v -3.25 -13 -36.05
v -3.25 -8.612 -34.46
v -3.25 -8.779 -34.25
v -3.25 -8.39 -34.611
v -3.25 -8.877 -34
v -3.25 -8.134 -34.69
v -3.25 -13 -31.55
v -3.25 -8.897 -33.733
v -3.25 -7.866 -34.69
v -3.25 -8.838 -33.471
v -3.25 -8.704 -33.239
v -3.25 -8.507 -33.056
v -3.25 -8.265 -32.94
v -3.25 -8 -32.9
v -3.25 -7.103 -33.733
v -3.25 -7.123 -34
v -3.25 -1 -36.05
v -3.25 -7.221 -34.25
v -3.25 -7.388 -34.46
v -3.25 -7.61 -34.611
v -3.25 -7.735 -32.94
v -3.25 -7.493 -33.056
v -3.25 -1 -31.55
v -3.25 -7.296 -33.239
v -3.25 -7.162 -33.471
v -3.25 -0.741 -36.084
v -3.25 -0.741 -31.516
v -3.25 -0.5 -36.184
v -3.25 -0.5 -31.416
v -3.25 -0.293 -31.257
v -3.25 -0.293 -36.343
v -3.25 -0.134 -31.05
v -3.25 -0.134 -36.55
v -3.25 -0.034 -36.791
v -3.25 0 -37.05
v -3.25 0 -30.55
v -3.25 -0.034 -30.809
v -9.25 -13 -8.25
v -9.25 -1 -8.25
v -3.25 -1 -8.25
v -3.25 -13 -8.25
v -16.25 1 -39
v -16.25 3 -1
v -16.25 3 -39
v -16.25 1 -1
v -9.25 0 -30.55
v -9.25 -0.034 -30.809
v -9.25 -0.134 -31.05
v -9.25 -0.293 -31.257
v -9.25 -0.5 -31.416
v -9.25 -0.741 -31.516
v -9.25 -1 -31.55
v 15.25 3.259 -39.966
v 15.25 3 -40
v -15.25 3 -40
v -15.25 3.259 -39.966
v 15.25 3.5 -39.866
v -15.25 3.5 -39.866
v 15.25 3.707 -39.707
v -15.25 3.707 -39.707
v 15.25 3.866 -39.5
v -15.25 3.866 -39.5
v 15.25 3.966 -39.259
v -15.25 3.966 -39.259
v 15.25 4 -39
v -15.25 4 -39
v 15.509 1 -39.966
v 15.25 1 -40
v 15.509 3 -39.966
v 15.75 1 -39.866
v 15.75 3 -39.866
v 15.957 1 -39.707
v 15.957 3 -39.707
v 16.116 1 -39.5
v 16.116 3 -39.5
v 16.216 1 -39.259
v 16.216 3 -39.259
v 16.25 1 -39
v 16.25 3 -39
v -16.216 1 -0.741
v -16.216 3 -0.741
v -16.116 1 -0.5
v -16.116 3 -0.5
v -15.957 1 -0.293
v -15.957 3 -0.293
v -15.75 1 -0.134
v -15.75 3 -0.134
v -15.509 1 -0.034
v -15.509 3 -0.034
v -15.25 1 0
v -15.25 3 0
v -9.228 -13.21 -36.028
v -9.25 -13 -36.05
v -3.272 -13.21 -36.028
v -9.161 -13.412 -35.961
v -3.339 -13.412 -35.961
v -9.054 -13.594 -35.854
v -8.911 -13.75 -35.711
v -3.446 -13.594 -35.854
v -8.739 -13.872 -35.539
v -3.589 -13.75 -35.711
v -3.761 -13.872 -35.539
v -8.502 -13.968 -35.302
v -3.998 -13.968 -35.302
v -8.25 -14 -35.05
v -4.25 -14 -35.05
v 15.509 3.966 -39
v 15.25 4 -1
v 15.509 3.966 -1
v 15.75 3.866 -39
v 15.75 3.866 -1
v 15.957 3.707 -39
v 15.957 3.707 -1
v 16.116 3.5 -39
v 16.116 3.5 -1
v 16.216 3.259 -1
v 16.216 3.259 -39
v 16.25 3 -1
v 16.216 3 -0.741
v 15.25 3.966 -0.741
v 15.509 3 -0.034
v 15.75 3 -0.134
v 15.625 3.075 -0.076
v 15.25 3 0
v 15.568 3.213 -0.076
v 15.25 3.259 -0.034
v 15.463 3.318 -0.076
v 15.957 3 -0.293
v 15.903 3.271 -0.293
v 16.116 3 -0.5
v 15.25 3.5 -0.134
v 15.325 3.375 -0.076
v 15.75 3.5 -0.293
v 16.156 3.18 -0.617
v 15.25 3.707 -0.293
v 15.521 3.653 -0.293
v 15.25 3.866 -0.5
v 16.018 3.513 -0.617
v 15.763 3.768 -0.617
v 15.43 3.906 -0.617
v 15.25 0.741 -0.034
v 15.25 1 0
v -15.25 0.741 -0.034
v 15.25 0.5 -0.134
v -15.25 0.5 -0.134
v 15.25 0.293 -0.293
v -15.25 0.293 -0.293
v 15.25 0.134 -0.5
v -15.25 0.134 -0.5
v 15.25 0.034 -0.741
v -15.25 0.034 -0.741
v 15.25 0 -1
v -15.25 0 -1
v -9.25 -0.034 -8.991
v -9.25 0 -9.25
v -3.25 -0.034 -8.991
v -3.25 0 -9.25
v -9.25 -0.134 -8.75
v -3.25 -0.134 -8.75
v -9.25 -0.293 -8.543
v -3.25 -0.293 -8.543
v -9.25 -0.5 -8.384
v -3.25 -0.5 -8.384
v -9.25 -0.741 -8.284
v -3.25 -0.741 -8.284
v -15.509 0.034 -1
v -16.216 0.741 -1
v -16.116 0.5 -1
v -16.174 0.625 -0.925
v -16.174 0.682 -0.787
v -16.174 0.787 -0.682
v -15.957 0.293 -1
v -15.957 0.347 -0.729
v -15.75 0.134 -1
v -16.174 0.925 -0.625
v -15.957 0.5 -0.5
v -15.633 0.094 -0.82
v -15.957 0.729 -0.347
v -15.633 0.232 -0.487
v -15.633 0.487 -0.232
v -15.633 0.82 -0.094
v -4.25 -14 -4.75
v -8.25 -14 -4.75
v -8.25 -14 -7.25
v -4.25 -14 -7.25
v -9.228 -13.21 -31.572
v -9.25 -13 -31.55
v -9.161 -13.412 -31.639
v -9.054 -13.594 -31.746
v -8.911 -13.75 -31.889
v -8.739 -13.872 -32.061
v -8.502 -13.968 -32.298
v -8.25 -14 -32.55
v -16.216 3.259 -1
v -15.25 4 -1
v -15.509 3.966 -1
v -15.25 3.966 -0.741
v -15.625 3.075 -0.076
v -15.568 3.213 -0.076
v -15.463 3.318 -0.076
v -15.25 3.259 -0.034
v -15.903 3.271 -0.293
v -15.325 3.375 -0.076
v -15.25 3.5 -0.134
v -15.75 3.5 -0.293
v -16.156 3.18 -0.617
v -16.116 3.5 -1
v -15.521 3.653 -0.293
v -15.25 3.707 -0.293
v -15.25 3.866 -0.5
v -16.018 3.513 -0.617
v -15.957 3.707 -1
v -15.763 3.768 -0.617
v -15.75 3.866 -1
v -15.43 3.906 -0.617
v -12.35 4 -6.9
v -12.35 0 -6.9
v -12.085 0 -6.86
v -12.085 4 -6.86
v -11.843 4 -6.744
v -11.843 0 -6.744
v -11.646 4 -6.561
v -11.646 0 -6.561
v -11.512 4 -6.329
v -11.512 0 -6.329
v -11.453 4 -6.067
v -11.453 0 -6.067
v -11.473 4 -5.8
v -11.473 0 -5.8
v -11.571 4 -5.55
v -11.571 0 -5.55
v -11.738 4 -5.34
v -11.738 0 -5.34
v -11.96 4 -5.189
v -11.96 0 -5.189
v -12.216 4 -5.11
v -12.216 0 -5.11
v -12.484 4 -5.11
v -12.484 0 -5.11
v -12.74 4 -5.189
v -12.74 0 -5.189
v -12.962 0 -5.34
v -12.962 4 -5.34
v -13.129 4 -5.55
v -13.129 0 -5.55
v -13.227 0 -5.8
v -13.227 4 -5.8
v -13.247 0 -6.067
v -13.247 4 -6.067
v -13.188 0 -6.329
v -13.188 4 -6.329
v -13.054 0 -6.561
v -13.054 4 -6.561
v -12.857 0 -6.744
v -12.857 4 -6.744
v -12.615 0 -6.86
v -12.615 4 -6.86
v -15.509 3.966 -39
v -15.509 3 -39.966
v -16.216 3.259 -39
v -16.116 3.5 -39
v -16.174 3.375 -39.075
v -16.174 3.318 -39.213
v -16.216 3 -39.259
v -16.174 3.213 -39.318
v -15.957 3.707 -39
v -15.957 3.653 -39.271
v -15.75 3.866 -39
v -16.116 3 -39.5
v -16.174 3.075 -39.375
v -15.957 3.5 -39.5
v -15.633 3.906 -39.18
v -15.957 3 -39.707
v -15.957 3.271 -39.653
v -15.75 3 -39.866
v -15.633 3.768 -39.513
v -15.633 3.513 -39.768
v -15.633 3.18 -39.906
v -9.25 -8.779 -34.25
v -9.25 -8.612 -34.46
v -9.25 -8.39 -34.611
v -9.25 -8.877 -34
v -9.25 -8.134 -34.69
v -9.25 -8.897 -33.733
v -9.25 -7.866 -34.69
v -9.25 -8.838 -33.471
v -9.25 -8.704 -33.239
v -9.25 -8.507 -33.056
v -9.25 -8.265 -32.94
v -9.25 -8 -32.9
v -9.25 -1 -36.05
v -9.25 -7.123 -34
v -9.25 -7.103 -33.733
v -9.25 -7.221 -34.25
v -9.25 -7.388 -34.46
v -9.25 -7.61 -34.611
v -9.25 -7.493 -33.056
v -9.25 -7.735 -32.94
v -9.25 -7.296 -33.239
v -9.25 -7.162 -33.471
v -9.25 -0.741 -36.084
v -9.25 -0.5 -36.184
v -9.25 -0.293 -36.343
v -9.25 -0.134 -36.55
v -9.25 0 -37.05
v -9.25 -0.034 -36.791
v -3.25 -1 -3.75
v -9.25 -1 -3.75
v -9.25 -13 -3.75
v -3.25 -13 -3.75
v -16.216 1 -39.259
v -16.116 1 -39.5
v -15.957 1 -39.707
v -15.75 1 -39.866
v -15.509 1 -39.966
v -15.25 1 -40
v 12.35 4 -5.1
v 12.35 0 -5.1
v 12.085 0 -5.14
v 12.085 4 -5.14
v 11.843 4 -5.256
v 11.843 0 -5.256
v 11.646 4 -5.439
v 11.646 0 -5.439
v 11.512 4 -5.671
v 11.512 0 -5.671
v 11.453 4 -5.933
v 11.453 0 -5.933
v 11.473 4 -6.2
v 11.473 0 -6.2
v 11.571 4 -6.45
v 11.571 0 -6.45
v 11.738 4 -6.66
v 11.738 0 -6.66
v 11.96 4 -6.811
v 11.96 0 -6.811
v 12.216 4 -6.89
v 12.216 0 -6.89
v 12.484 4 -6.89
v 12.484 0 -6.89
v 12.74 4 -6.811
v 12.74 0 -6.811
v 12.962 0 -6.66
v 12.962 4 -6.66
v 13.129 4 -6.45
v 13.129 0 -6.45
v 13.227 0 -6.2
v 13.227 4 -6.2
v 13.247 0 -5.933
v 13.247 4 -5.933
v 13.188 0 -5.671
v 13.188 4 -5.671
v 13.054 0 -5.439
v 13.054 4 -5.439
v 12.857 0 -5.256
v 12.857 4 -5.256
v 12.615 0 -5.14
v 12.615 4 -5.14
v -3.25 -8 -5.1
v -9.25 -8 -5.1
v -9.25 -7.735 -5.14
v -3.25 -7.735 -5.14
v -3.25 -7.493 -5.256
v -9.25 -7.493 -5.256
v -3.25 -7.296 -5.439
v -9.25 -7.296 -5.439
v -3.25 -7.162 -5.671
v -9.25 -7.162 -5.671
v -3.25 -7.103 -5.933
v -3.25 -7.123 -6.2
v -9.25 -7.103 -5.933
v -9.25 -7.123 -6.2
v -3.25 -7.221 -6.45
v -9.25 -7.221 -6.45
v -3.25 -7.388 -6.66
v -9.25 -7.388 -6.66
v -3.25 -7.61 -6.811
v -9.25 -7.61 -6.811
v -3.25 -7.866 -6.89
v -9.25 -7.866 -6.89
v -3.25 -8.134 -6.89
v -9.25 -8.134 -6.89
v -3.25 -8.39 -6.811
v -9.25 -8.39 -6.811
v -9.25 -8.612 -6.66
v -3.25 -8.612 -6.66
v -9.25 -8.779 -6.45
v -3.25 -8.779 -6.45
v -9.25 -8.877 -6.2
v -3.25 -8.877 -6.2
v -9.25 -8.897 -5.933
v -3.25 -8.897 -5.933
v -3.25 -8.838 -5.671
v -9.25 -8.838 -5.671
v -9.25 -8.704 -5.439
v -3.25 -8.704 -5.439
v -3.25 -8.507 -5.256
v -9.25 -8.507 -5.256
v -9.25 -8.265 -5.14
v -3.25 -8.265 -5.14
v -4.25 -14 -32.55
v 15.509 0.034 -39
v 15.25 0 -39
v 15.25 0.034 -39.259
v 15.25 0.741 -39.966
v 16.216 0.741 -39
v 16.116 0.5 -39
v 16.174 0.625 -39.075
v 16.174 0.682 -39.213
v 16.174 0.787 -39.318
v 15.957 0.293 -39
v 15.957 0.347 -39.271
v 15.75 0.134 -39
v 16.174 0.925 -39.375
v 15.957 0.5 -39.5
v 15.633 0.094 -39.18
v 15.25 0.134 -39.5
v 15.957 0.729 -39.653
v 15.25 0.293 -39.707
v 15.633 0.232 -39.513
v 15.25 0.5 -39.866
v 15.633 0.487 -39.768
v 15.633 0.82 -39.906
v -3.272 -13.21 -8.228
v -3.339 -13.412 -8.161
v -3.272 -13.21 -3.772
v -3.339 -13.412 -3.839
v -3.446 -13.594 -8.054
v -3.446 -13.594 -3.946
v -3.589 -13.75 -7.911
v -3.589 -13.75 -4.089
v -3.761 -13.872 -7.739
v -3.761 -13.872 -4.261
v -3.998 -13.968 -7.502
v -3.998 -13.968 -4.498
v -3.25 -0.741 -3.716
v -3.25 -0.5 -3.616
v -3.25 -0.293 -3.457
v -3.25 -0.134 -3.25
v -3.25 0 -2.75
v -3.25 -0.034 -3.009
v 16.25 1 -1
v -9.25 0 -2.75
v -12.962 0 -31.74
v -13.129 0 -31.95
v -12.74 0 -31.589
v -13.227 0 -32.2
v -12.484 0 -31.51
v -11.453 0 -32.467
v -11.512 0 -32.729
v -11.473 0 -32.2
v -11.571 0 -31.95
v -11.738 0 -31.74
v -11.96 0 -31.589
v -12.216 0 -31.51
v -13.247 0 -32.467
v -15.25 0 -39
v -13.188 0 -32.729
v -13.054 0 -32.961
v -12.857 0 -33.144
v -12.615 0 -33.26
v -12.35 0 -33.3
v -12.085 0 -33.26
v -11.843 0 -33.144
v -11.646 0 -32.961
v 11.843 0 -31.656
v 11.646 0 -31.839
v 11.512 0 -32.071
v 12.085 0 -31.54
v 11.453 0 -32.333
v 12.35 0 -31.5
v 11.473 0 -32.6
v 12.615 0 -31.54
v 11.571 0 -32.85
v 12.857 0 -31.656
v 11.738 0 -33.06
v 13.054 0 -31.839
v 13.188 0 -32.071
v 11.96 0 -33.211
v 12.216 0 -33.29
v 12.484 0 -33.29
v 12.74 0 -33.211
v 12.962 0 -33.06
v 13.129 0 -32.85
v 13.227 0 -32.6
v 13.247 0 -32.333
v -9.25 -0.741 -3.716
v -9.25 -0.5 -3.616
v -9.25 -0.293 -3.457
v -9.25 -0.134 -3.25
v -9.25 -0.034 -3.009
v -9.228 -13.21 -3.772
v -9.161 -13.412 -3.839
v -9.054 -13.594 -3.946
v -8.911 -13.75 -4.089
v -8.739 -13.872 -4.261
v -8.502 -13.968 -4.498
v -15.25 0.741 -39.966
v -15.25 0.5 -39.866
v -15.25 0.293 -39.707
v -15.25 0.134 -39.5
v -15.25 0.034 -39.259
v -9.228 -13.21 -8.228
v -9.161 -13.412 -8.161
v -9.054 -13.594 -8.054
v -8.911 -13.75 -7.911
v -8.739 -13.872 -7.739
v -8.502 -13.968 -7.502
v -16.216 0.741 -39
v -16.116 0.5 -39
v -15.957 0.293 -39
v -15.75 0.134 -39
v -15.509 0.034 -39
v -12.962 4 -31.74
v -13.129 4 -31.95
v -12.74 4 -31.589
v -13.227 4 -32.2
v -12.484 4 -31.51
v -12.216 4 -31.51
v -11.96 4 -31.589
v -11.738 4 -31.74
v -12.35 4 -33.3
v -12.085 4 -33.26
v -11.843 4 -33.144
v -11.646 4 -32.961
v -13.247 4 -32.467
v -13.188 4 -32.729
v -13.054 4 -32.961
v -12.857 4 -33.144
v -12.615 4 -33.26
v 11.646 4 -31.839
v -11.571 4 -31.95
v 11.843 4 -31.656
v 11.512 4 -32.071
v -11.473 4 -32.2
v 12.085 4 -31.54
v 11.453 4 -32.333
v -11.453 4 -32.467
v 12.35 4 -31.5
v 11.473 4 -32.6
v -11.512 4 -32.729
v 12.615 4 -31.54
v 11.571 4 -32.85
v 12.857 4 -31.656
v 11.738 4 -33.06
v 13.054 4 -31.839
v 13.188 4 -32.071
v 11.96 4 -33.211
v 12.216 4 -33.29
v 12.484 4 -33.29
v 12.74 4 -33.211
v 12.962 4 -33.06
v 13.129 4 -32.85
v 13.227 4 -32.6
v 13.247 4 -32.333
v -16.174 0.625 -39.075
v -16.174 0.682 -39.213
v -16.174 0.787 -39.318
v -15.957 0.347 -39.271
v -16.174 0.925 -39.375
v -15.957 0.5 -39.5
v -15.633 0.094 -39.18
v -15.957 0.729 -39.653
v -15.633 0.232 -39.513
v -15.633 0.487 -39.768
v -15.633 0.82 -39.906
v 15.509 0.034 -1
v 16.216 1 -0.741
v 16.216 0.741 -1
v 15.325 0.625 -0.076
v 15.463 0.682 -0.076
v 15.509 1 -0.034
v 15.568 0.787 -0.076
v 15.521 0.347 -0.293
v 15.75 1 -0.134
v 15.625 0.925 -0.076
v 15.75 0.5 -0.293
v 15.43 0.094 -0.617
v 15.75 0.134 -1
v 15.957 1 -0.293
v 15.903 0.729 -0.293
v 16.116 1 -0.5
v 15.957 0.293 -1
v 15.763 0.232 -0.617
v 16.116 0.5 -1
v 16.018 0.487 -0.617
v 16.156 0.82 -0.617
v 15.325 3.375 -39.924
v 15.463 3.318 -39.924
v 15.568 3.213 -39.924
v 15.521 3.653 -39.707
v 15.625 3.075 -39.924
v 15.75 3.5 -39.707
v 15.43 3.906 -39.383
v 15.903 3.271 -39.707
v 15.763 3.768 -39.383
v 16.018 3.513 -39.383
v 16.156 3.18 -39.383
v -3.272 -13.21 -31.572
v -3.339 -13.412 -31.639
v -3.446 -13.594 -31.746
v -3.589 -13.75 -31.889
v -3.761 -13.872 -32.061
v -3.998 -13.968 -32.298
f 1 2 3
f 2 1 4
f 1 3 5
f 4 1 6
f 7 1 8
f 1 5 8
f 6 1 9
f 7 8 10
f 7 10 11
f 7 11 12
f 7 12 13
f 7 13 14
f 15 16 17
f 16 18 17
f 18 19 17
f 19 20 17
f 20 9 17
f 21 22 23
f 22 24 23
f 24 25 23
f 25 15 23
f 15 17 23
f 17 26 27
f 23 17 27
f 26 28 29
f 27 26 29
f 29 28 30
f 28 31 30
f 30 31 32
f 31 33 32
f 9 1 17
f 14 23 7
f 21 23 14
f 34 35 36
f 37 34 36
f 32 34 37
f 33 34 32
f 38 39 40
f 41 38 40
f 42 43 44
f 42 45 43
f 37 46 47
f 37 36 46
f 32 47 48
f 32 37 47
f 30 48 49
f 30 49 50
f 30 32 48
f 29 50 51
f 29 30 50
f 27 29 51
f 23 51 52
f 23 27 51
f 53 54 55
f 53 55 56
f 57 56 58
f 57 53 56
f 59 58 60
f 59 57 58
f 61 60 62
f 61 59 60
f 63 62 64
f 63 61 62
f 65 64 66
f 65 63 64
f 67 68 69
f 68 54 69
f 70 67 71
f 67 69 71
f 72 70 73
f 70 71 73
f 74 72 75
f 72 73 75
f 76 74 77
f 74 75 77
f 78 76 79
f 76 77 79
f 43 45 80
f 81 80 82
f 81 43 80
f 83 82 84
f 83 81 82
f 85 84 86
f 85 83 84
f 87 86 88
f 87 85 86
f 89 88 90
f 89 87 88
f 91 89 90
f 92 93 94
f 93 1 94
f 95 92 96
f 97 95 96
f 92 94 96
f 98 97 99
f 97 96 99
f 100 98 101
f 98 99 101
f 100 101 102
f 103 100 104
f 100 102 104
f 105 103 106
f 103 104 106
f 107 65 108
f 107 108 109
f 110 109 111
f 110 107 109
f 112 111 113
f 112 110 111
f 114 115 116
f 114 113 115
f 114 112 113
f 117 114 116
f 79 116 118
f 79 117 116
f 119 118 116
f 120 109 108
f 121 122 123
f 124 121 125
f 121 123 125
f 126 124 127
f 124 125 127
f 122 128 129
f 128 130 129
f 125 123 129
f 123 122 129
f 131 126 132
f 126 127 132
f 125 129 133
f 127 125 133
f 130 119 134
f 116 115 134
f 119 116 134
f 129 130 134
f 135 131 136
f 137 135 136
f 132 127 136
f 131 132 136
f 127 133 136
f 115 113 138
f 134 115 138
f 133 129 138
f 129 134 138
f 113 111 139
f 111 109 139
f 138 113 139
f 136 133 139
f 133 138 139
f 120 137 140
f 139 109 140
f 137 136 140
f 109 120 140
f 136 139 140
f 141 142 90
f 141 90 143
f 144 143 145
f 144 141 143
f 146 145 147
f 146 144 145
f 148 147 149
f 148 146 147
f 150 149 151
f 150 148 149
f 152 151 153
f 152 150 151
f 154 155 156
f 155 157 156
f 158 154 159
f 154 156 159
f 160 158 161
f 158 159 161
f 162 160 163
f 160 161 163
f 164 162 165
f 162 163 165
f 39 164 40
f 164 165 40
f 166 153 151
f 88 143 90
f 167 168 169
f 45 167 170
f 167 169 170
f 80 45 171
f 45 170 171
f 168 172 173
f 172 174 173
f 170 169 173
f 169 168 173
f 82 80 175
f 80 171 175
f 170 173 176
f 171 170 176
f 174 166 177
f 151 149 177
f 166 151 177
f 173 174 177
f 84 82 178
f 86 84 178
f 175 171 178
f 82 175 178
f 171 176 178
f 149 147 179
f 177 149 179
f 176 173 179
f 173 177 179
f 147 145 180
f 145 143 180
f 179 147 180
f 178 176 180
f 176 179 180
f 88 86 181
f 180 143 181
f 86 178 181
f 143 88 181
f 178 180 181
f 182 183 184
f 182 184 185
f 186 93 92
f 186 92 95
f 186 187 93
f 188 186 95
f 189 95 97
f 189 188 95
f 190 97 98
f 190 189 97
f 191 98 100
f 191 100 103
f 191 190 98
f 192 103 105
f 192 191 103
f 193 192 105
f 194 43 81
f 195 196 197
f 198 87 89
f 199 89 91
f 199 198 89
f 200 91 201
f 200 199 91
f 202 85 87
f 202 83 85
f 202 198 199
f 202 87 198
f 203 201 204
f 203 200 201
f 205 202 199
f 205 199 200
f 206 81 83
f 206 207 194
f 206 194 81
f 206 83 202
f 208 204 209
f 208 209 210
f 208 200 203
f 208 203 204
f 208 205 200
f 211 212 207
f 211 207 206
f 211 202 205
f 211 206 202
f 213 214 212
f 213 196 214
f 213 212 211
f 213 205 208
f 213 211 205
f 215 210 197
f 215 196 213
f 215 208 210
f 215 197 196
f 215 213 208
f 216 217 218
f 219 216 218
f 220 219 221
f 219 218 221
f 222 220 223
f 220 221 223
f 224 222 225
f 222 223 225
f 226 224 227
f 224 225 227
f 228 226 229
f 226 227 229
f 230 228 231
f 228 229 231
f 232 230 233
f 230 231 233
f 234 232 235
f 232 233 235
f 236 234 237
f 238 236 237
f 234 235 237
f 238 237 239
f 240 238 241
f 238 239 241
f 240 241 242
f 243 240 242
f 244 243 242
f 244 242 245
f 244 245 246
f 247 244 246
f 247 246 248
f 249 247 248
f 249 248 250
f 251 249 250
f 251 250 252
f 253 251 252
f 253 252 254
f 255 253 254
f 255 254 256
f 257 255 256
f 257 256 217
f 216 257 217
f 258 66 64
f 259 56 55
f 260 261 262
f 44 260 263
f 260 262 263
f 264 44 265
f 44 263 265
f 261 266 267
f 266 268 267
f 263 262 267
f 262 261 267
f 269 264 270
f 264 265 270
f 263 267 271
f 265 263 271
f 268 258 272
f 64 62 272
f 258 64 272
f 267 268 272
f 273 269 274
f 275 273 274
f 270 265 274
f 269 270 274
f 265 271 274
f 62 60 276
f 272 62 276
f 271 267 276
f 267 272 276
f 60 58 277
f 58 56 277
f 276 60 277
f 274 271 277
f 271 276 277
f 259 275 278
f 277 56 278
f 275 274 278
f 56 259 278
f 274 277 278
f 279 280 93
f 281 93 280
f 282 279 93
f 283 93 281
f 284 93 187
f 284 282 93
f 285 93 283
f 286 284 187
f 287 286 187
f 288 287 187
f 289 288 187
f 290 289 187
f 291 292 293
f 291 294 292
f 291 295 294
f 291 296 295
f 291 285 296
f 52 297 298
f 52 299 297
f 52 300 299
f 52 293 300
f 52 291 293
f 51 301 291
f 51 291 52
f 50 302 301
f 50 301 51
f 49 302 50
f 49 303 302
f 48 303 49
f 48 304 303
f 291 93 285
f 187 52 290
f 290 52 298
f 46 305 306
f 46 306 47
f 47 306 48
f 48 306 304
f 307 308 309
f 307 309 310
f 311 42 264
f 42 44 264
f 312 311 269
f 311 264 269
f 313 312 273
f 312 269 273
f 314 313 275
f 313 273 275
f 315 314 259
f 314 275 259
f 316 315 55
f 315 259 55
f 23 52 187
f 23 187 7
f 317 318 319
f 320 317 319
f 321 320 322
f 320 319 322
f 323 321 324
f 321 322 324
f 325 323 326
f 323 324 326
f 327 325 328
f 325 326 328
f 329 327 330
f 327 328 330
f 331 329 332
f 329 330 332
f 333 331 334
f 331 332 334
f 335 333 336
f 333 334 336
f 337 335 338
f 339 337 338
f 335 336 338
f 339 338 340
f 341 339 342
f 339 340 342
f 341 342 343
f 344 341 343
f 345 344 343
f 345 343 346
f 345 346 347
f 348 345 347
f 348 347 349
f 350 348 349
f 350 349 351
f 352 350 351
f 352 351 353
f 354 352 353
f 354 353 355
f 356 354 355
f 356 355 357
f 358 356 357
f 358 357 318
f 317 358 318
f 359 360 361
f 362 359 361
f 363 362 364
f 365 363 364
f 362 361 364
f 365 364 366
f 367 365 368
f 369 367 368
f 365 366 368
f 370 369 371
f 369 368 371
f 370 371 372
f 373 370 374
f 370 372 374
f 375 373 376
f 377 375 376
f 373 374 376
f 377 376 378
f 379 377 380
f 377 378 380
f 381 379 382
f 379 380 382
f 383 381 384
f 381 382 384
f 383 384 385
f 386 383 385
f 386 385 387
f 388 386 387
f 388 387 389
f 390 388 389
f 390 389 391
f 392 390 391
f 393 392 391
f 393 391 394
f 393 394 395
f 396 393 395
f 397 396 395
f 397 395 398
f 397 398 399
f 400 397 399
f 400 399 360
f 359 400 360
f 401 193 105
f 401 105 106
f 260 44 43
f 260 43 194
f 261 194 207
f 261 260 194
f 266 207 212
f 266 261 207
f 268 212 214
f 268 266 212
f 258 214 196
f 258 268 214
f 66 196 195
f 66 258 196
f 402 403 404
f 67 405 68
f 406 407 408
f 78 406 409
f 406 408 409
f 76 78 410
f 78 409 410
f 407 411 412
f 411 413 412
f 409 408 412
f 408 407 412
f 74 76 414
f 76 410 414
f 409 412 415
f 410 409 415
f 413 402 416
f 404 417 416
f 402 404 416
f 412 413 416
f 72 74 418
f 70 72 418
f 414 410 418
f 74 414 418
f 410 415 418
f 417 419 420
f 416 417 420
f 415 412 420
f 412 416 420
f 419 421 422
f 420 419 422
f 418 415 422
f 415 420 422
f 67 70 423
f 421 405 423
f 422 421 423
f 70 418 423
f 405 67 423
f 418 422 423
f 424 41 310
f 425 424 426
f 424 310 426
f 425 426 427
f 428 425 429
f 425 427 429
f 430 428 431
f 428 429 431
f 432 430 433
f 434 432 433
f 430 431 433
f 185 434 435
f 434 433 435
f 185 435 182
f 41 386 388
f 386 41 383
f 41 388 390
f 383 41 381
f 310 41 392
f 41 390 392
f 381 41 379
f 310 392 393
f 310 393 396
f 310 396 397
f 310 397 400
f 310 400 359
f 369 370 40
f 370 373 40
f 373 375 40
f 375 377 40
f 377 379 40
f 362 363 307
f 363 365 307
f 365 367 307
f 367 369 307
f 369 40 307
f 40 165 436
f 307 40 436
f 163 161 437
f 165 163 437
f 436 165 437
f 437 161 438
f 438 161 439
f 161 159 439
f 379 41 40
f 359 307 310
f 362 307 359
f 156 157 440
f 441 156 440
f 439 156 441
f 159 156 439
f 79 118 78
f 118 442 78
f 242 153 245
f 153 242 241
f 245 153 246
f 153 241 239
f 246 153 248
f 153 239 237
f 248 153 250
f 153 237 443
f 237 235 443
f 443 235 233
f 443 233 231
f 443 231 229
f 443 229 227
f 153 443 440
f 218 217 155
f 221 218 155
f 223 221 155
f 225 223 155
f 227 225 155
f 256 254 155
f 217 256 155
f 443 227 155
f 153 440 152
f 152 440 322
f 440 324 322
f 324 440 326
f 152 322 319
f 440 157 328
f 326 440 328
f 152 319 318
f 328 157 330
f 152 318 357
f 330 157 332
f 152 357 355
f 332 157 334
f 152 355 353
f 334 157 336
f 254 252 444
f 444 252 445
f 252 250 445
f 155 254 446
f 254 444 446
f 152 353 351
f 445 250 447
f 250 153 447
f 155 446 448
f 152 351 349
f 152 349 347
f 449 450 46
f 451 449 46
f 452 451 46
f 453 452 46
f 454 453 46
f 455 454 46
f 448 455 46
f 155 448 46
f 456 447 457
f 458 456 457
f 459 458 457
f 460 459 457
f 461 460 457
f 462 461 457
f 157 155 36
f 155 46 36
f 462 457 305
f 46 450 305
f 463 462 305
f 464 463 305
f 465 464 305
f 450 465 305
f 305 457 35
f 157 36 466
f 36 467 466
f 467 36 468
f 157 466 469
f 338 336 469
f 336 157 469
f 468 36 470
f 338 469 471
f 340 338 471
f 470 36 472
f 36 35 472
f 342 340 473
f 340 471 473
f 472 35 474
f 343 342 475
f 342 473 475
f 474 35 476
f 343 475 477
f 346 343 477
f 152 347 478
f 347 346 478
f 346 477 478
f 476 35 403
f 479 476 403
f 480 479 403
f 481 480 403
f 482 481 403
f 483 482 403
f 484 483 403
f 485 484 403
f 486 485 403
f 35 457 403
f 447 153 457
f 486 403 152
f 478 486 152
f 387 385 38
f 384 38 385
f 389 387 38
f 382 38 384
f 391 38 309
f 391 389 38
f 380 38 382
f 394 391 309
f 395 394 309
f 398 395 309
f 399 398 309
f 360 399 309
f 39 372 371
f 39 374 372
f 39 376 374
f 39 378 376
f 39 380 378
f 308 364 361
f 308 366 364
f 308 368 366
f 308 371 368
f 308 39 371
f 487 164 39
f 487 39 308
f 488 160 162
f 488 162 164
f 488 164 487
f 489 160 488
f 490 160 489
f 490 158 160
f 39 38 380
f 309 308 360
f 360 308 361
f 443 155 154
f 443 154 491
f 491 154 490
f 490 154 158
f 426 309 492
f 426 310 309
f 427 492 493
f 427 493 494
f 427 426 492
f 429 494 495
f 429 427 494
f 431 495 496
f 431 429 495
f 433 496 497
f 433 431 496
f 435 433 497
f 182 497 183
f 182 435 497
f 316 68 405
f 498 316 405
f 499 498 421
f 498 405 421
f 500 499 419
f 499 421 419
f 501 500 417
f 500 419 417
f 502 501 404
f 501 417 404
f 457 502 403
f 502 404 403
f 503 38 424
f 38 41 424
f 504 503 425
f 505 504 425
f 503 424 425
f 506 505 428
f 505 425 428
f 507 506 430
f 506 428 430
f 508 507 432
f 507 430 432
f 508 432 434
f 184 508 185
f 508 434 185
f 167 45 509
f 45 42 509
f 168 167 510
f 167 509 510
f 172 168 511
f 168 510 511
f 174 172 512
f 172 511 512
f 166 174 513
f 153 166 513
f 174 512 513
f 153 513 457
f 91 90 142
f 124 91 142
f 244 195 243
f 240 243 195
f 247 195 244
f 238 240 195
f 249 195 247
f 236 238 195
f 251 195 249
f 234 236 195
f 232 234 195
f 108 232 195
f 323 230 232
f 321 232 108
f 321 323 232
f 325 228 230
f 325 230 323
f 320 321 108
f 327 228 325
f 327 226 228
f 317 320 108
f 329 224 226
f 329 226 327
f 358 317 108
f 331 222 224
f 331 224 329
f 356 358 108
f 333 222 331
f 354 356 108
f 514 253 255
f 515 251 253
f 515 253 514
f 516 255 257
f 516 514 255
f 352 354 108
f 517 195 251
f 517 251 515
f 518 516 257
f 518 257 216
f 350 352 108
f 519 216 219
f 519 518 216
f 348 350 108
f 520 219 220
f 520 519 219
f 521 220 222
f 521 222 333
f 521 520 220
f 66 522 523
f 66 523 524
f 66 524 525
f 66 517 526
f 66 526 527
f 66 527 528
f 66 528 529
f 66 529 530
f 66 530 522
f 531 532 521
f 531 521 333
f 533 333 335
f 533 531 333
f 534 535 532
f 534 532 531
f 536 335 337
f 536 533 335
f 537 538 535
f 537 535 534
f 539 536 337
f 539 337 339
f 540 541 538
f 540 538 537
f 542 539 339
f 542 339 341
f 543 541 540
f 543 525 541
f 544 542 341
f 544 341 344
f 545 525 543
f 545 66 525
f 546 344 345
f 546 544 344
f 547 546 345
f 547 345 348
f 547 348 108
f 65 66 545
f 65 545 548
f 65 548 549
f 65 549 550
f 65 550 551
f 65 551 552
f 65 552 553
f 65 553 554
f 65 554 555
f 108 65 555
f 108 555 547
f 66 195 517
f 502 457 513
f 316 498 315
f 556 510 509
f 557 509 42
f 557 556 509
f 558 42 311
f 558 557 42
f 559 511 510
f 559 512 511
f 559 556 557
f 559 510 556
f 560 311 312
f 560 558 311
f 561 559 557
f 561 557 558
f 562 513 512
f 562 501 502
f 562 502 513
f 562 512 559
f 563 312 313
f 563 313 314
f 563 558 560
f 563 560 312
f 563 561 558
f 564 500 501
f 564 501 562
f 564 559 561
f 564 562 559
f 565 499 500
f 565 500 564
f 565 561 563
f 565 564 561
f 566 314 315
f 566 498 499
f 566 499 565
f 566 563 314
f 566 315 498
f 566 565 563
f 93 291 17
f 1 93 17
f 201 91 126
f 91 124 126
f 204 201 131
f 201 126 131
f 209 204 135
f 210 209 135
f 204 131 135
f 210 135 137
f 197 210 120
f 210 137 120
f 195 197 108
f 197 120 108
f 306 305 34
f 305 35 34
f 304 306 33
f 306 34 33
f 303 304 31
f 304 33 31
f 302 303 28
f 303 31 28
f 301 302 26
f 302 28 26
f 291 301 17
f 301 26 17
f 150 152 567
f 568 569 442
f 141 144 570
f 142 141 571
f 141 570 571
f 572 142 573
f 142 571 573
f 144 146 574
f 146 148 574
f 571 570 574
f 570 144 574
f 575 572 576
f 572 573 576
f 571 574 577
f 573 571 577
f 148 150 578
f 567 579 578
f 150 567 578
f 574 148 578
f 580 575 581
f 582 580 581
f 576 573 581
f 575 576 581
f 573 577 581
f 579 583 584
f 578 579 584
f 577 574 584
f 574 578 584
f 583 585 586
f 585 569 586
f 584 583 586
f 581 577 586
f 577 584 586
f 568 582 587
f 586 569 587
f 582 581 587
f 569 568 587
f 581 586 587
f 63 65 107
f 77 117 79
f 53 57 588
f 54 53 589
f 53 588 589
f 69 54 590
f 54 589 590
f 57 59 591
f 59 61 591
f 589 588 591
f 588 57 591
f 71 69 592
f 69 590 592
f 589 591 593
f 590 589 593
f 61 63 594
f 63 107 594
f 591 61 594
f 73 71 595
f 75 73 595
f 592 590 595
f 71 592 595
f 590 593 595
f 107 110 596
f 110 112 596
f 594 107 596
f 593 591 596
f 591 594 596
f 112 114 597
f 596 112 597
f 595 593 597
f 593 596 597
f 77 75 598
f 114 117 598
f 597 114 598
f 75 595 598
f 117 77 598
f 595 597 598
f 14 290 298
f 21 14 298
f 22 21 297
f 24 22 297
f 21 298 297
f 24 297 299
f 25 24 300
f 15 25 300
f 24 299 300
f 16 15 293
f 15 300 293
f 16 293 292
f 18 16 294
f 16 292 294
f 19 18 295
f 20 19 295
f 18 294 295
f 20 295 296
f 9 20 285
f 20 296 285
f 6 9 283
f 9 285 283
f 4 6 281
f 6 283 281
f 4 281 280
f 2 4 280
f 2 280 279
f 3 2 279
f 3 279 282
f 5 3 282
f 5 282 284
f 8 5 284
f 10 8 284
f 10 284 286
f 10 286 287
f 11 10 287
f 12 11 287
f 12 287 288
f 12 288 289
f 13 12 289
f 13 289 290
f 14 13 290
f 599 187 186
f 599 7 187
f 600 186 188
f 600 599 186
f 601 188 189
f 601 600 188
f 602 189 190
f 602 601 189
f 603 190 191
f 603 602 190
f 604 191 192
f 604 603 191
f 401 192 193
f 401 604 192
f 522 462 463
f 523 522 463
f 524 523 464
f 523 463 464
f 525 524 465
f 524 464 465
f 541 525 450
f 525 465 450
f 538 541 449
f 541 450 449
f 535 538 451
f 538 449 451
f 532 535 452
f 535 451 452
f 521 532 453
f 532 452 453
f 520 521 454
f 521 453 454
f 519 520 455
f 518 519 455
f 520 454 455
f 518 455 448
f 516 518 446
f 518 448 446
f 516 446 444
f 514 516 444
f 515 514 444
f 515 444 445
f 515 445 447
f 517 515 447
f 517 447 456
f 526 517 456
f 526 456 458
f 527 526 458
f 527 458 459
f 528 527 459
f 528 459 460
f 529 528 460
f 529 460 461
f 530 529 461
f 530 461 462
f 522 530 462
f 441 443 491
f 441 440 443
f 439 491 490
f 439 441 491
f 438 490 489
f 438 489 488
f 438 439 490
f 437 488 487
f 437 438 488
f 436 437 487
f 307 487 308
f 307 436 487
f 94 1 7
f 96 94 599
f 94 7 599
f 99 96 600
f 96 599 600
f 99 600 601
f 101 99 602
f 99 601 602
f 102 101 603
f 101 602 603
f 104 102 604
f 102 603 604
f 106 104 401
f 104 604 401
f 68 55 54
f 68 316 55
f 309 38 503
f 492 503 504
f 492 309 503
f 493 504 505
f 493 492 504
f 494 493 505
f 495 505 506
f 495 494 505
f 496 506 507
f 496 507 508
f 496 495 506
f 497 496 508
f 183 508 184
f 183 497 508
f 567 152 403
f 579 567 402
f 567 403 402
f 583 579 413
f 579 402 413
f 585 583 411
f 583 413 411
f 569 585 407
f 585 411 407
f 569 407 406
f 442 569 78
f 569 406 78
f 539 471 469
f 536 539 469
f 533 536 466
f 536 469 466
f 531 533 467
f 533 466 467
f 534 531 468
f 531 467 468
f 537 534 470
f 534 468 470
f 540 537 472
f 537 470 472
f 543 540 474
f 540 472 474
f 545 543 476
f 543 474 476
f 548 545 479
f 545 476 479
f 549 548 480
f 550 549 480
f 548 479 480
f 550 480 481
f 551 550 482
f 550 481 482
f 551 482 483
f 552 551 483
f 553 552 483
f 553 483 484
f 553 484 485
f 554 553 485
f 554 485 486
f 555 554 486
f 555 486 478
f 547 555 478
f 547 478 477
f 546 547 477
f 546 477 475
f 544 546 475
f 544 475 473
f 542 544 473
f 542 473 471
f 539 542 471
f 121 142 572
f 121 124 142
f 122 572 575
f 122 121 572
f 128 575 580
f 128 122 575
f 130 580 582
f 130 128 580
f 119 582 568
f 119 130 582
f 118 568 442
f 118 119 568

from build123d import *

# Parameters (mm, degrees)
SKETCH1_W                     = 32.5
SKETCH1_H                     = 40
BASE_DEPTH                    = 4
SKETCH4_R                     = 0.9
SCANNER_MOUNTING_HOLES_DEPTH  = 44.359687499
SKETCH6_W                     = 6
SKETCH6_H                     = 4.5
SERVO_MOUNTING_PLATFORM_DEPTH = 14
SERVO_MOUNTING_HOLES_REACH    = 51.46
SKETCH7_R                     = 0.9
FILLET1_R                     = 1


with BuildPart() as part:
    # Sketch1 → Base (new body)
    with BuildSketch(Plane(origin=(0, 0, 0), x_dir=(1, 0, 0), z_dir=(0, 1, 0))):
        with Locations((0, 20)):
            Rectangle(SKETCH1_W, SKETCH1_H)
    extrude(amount=BASE_DEPTH)

    # Sketch4 → Scanner Mounting Holes (cut, through all)
    with BuildSketch(Plane.XZ):
        with Locations(Location((-12.35, -6, 0), (0, 0, 270))):
            Circle(SKETCH4_R)
        with Locations(Location((-12.35, -32.4, 0), (0, 0, 270))):
            Circle(SKETCH4_R)
        with Locations(Location((12.35, -32.4, 0), (0, 0, 90))):
            Circle(SKETCH4_R)
        with Locations(Location((12.35, -6, 0), (0, 0, 90))):
            Circle(SKETCH4_R)
    extrude(amount=-SCANNER_MOUNTING_HOLES_DEPTH, mode=Mode.SUBTRACT)

    # Sketch6 → Servo Mounting Platform (add)
    with BuildSketch(Plane.XZ):
        with Locations((-6.25, -6)):
            Rectangle(SKETCH6_W, SKETCH6_H)
        with Locations((-6.25, -33.8)):
            Rectangle(SKETCH6_W, SKETCH6_H)
    extrude(amount=SERVO_MOUNTING_PLATFORM_DEPTH)

    # Sketch7 → Servo Mounting Holes (cut, up to next)
    with BuildSketch(Plane.ZY.offset(9.25), mode=Mode.PRIVATE) as servo_mounting_holes_sk1:
        with Locations((-33.8, -8)):
            Circle(SKETCH7_R)
    servo_mounting_holes_tool1 = extrude(servo_mounting_holes_sk1.sketch, amount=-SERVO_MOUNTING_HOLES_REACH, mode=Mode.PRIVATE) & part.part
    # Sketch7 → Servo Mounting Holes (cut, up to next)
    with BuildSketch(Plane.ZY.offset(9.25), mode=Mode.PRIVATE) as servo_mounting_holes_sk2:
        with Locations((-6, -8)):
            Circle(SKETCH7_R)
    servo_mounting_holes_tool2 = extrude(servo_mounting_holes_sk2.sketch, amount=-SERVO_MOUNTING_HOLES_REACH, mode=Mode.PRIVATE) & part.part
    add(servo_mounting_holes_tool1.solids().sort_by_distance((-9.25, -8, -33.8))[0], mode=Mode.SUBTRACT)
    add(servo_mounting_holes_tool2.solids().sort_by_distance((-9.25, -8, -6))[0], mode=Mode.SUBTRACT)

    # Fillet1
    fillet1_edges = [part.edges().sort_by_distance(p)[0] for p in [
        (16.25, 4, -20),
        (0, 4, -40),
        (-6.25, 0, -8.25),
        (-6.25, 0, -3.75),
        (-9.25, -14, -6),
        (-6.25, -14, -8.25),
        (-3.25, -14, -6),
        (-6.25, -14, -3.75),
        (-6.25, 0, -36.05),
        (-6.25, 0, -31.55),
        (-9.25, -14, -33.8),
        (-6.25, -14, -36.05),
        (-3.25, -14, -33.8),
        (-6.25, -14, -31.55),
        (-16.25, 4, -20),
        (0, 0, -40),
        (16.25, 0, -20),
        (0, 0, 0),
        (-16.25, 0, -20),
        (-16.25, 2, -40),
        (16.25, 2, -40),
        (16.25, 2, 0),
        (-16.25, 2, 0),
        (0, 4, 0),
    ]]
    fillet(fillet1_edges, radius=FILLET1_R)


solid = part.part
